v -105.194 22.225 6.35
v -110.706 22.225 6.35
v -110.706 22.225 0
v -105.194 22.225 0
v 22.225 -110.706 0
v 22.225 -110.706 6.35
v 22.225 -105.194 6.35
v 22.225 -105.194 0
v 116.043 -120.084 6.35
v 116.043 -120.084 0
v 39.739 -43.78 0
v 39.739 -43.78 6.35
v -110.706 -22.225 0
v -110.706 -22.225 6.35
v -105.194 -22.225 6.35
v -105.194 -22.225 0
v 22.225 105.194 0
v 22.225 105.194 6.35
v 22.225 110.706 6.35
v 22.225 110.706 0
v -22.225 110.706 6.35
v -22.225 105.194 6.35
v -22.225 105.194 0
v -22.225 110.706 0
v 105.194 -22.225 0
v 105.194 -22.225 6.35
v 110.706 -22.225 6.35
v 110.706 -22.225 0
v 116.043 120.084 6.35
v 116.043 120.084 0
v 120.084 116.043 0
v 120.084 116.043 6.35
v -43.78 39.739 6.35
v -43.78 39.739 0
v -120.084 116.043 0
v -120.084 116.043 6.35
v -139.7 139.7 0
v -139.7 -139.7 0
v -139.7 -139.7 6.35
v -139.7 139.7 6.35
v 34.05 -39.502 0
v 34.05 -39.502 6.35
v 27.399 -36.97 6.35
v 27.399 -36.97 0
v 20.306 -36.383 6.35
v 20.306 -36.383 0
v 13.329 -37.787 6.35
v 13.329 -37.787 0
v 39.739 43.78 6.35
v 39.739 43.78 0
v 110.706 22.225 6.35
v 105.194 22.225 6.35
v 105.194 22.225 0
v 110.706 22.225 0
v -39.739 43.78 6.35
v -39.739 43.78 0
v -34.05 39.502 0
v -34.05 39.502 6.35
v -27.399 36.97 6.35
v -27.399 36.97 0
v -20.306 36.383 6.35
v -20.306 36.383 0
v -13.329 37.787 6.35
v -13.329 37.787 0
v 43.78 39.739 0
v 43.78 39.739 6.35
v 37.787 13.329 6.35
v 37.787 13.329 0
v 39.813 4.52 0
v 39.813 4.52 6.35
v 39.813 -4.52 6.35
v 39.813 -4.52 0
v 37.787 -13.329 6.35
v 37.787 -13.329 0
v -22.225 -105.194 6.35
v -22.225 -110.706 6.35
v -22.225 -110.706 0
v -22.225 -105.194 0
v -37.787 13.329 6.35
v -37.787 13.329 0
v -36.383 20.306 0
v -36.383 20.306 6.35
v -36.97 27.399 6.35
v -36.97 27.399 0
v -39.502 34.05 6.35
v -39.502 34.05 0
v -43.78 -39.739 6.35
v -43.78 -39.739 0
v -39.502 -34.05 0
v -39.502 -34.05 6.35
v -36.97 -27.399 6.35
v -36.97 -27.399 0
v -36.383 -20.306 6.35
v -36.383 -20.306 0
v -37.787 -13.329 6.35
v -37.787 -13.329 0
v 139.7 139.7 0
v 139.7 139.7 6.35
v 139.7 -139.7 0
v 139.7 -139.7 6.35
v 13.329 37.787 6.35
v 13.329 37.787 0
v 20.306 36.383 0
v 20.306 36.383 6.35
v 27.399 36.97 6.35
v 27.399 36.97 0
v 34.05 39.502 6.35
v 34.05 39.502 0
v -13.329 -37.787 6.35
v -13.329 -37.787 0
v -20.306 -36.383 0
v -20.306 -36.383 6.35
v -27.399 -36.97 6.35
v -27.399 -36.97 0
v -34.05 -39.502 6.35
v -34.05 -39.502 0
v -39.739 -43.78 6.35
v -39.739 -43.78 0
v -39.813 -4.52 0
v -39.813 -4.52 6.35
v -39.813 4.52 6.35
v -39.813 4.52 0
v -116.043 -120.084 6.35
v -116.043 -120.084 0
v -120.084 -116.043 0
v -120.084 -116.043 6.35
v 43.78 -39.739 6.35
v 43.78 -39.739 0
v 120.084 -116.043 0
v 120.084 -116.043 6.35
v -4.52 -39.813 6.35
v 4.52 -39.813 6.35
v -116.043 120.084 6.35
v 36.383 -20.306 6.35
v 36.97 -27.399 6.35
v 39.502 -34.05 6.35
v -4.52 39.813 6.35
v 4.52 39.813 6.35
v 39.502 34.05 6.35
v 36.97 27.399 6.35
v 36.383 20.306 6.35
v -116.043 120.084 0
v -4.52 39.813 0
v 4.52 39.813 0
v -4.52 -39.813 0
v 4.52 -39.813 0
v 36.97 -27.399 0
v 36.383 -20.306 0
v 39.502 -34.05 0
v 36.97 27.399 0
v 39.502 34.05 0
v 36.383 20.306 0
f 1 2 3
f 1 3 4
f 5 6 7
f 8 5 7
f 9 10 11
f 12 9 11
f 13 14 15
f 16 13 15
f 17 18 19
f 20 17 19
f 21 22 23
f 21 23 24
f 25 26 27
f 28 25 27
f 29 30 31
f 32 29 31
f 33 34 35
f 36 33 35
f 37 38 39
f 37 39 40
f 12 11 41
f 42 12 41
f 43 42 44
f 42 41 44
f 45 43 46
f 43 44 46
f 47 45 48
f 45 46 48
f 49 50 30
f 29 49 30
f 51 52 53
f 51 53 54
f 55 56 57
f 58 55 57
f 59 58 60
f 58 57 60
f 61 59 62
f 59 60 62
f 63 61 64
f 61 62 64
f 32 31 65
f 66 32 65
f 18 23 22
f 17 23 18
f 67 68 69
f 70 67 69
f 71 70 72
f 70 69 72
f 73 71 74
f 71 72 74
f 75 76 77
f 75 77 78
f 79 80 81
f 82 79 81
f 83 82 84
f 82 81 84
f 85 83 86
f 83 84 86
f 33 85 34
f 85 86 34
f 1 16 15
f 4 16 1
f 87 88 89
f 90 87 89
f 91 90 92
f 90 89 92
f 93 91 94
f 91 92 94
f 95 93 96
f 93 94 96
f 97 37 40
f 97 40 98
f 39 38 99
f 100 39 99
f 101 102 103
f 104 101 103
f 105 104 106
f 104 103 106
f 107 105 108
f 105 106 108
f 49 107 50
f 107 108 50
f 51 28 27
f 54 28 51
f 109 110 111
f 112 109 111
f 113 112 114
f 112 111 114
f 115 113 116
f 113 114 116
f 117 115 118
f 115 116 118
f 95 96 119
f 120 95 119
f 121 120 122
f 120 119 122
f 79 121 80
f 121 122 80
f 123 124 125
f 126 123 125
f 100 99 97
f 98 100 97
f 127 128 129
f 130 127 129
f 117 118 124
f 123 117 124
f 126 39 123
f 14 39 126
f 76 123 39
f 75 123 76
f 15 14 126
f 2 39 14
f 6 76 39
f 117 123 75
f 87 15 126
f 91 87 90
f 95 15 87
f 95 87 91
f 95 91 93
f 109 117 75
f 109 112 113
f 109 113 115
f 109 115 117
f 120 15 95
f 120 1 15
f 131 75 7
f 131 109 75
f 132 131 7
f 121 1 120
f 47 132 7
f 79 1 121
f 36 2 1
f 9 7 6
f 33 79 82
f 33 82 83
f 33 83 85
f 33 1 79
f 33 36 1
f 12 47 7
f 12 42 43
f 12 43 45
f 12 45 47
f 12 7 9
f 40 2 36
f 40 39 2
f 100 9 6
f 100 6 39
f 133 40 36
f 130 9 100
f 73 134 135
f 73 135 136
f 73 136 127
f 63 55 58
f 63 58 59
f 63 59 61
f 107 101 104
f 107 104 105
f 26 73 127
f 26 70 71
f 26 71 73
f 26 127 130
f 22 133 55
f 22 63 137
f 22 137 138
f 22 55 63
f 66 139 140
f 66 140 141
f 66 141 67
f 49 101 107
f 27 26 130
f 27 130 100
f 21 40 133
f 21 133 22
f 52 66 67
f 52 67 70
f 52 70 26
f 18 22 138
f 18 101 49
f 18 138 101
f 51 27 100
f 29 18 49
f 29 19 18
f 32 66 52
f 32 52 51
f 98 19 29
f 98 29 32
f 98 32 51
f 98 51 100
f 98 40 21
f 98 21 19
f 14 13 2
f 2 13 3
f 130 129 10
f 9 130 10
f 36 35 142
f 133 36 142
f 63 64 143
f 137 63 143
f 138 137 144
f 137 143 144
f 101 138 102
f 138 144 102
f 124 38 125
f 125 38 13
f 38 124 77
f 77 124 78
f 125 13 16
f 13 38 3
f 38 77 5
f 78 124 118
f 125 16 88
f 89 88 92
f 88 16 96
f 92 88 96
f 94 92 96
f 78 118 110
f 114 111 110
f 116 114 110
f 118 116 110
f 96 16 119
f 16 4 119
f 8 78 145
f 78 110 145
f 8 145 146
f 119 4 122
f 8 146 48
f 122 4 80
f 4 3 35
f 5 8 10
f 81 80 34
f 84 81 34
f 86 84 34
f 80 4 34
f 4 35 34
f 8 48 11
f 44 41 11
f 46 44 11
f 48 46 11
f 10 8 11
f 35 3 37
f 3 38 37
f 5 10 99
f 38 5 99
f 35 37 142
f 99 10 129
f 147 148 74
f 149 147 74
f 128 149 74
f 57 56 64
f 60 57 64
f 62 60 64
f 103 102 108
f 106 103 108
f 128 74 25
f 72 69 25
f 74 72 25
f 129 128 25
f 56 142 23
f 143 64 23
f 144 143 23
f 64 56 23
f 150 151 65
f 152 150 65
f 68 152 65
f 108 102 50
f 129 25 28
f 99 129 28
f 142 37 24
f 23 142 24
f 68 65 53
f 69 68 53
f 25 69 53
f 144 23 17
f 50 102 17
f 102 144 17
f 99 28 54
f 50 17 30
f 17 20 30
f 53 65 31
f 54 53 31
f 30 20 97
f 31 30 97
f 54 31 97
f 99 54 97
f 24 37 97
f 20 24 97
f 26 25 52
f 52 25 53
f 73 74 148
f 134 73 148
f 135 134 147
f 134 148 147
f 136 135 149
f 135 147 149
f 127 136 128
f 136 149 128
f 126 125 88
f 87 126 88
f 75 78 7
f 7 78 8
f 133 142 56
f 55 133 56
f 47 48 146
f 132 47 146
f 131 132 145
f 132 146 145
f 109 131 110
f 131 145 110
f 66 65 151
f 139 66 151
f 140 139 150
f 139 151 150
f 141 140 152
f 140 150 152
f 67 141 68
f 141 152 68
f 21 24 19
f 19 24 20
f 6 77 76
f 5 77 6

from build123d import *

# Parameters (mm, degrees)
SKETCH2_W           = 279.4
SKETCH2_H           = 279.4
SKETCH2_W_2         = 44.45
SKETCH2_H_2         = 5.5118
SKETCH2_W_3         = 5.5118
SKETCH2_H_3         = 44.45
BOSS_EXTRUDE1_DEPTH = 6.35


with BuildPart() as part:
    # Sketch2 → Boss-Extrude1 (new body)
    with BuildSketch(Plane.XY):
        Rectangle(SKETCH2_W, SKETCH2_H)
        with BuildLine():
            Line((-43.779617638, 39.738502384), (-120.083686649, 116.042571394))
            Line((-120.083686649, 116.042571394), (-116.042571394, 120.083686649))
            Line((-116.042571394, 120.083686649), (-39.738502384, 43.779617638))
            ThreePointArc((-39.738502384, 43.779617638), (-27.398923769, 36.969883512), (-13.328721415, 37.786636231))
            ThreePointArc((-13.328721415, 37.786636231), (0, 40.0685), (13.328721415, 37.786636231))
            ThreePointArc((13.328721415, 37.786636231), (27.398923769, 36.969883512), (39.738502384, 43.779617638))
            Line((39.738502384, 43.779617638), (116.042571394, 120.083686649))
            Line((116.042571394, 120.083686649), (120.083686649, 116.042571394))
            Line((120.083686649, 116.042571394), (43.779617638, 39.738502384))
            ThreePointArc((43.779617638, 39.738502384), (36.969883512, 27.398923769), (37.786636231, 13.328721415))
            ThreePointArc((37.786636231, 13.328721415), (40.0685, 0), (37.786636231, -13.328721415))
            ThreePointArc((37.786636231, -13.328721415), (36.969883512, -27.398923769), (43.779617638, -39.738502384))
            Line((43.779617638, -39.738502384), (120.083686649, -116.042571394))
            Line((120.083686649, -116.042571394), (116.042571394, -120.083686649))
            Line((116.042571394, -120.083686649), (39.738502384, -43.779617638))
            ThreePointArc((39.738502384, -43.779617638), (27.398923769, -36.969883512), (13.328721415, -37.786636231))
            ThreePointArc((13.328721415, -37.786636231), (0, -40.0685), (-13.328721415, -37.786636231))
            ThreePointArc((-13.328721415, -37.786636231), (-27.398923769, -36.969883512), (-39.738502384, -43.779617638))
            Line((-39.738502384, -43.779617638), (-116.042571394, -120.083686649))
            Line((-116.042571394, -120.083686649), (-120.083686649, -116.042571394))
            Line((-120.083686649, -116.042571394), (-43.779617638, -39.738502384))
            ThreePointArc((-43.779617638, -39.738502384), (-36.969883512, -27.398923769), (-37.786636231, -13.328721415))
            ThreePointArc((-37.786636231, -13.328721415), (-40.0685, 0), (-37.786636231, 13.328721415))
            ThreePointArc((-37.786636231, 13.328721415), (-36.969883512, 27.398923769), (-43.779617638, 39.738502384))
        make_face(mode=Mode.SUBTRACT)
        with Locations((0, -107.95)):
            Rectangle(SKETCH2_W_2, SKETCH2_H_2, mode=Mode.SUBTRACT)
        with Locations((-107.95, 0)):
            Rectangle(SKETCH2_W_3, SKETCH2_H_3, mode=Mode.SUBTRACT)
        with Locations((0, 107.95)):
            Rectangle(SKETCH2_W_2, SKETCH2_H_2, mode=Mode.SUBTRACT)
        with Locations((107.95, 0)):
            Rectangle(SKETCH2_W_3, SKETCH2_H_3, mode=Mode.SUBTRACT)
    extrude(amount=BOSS_EXTRUDE1_DEPTH)


solid = part.part
